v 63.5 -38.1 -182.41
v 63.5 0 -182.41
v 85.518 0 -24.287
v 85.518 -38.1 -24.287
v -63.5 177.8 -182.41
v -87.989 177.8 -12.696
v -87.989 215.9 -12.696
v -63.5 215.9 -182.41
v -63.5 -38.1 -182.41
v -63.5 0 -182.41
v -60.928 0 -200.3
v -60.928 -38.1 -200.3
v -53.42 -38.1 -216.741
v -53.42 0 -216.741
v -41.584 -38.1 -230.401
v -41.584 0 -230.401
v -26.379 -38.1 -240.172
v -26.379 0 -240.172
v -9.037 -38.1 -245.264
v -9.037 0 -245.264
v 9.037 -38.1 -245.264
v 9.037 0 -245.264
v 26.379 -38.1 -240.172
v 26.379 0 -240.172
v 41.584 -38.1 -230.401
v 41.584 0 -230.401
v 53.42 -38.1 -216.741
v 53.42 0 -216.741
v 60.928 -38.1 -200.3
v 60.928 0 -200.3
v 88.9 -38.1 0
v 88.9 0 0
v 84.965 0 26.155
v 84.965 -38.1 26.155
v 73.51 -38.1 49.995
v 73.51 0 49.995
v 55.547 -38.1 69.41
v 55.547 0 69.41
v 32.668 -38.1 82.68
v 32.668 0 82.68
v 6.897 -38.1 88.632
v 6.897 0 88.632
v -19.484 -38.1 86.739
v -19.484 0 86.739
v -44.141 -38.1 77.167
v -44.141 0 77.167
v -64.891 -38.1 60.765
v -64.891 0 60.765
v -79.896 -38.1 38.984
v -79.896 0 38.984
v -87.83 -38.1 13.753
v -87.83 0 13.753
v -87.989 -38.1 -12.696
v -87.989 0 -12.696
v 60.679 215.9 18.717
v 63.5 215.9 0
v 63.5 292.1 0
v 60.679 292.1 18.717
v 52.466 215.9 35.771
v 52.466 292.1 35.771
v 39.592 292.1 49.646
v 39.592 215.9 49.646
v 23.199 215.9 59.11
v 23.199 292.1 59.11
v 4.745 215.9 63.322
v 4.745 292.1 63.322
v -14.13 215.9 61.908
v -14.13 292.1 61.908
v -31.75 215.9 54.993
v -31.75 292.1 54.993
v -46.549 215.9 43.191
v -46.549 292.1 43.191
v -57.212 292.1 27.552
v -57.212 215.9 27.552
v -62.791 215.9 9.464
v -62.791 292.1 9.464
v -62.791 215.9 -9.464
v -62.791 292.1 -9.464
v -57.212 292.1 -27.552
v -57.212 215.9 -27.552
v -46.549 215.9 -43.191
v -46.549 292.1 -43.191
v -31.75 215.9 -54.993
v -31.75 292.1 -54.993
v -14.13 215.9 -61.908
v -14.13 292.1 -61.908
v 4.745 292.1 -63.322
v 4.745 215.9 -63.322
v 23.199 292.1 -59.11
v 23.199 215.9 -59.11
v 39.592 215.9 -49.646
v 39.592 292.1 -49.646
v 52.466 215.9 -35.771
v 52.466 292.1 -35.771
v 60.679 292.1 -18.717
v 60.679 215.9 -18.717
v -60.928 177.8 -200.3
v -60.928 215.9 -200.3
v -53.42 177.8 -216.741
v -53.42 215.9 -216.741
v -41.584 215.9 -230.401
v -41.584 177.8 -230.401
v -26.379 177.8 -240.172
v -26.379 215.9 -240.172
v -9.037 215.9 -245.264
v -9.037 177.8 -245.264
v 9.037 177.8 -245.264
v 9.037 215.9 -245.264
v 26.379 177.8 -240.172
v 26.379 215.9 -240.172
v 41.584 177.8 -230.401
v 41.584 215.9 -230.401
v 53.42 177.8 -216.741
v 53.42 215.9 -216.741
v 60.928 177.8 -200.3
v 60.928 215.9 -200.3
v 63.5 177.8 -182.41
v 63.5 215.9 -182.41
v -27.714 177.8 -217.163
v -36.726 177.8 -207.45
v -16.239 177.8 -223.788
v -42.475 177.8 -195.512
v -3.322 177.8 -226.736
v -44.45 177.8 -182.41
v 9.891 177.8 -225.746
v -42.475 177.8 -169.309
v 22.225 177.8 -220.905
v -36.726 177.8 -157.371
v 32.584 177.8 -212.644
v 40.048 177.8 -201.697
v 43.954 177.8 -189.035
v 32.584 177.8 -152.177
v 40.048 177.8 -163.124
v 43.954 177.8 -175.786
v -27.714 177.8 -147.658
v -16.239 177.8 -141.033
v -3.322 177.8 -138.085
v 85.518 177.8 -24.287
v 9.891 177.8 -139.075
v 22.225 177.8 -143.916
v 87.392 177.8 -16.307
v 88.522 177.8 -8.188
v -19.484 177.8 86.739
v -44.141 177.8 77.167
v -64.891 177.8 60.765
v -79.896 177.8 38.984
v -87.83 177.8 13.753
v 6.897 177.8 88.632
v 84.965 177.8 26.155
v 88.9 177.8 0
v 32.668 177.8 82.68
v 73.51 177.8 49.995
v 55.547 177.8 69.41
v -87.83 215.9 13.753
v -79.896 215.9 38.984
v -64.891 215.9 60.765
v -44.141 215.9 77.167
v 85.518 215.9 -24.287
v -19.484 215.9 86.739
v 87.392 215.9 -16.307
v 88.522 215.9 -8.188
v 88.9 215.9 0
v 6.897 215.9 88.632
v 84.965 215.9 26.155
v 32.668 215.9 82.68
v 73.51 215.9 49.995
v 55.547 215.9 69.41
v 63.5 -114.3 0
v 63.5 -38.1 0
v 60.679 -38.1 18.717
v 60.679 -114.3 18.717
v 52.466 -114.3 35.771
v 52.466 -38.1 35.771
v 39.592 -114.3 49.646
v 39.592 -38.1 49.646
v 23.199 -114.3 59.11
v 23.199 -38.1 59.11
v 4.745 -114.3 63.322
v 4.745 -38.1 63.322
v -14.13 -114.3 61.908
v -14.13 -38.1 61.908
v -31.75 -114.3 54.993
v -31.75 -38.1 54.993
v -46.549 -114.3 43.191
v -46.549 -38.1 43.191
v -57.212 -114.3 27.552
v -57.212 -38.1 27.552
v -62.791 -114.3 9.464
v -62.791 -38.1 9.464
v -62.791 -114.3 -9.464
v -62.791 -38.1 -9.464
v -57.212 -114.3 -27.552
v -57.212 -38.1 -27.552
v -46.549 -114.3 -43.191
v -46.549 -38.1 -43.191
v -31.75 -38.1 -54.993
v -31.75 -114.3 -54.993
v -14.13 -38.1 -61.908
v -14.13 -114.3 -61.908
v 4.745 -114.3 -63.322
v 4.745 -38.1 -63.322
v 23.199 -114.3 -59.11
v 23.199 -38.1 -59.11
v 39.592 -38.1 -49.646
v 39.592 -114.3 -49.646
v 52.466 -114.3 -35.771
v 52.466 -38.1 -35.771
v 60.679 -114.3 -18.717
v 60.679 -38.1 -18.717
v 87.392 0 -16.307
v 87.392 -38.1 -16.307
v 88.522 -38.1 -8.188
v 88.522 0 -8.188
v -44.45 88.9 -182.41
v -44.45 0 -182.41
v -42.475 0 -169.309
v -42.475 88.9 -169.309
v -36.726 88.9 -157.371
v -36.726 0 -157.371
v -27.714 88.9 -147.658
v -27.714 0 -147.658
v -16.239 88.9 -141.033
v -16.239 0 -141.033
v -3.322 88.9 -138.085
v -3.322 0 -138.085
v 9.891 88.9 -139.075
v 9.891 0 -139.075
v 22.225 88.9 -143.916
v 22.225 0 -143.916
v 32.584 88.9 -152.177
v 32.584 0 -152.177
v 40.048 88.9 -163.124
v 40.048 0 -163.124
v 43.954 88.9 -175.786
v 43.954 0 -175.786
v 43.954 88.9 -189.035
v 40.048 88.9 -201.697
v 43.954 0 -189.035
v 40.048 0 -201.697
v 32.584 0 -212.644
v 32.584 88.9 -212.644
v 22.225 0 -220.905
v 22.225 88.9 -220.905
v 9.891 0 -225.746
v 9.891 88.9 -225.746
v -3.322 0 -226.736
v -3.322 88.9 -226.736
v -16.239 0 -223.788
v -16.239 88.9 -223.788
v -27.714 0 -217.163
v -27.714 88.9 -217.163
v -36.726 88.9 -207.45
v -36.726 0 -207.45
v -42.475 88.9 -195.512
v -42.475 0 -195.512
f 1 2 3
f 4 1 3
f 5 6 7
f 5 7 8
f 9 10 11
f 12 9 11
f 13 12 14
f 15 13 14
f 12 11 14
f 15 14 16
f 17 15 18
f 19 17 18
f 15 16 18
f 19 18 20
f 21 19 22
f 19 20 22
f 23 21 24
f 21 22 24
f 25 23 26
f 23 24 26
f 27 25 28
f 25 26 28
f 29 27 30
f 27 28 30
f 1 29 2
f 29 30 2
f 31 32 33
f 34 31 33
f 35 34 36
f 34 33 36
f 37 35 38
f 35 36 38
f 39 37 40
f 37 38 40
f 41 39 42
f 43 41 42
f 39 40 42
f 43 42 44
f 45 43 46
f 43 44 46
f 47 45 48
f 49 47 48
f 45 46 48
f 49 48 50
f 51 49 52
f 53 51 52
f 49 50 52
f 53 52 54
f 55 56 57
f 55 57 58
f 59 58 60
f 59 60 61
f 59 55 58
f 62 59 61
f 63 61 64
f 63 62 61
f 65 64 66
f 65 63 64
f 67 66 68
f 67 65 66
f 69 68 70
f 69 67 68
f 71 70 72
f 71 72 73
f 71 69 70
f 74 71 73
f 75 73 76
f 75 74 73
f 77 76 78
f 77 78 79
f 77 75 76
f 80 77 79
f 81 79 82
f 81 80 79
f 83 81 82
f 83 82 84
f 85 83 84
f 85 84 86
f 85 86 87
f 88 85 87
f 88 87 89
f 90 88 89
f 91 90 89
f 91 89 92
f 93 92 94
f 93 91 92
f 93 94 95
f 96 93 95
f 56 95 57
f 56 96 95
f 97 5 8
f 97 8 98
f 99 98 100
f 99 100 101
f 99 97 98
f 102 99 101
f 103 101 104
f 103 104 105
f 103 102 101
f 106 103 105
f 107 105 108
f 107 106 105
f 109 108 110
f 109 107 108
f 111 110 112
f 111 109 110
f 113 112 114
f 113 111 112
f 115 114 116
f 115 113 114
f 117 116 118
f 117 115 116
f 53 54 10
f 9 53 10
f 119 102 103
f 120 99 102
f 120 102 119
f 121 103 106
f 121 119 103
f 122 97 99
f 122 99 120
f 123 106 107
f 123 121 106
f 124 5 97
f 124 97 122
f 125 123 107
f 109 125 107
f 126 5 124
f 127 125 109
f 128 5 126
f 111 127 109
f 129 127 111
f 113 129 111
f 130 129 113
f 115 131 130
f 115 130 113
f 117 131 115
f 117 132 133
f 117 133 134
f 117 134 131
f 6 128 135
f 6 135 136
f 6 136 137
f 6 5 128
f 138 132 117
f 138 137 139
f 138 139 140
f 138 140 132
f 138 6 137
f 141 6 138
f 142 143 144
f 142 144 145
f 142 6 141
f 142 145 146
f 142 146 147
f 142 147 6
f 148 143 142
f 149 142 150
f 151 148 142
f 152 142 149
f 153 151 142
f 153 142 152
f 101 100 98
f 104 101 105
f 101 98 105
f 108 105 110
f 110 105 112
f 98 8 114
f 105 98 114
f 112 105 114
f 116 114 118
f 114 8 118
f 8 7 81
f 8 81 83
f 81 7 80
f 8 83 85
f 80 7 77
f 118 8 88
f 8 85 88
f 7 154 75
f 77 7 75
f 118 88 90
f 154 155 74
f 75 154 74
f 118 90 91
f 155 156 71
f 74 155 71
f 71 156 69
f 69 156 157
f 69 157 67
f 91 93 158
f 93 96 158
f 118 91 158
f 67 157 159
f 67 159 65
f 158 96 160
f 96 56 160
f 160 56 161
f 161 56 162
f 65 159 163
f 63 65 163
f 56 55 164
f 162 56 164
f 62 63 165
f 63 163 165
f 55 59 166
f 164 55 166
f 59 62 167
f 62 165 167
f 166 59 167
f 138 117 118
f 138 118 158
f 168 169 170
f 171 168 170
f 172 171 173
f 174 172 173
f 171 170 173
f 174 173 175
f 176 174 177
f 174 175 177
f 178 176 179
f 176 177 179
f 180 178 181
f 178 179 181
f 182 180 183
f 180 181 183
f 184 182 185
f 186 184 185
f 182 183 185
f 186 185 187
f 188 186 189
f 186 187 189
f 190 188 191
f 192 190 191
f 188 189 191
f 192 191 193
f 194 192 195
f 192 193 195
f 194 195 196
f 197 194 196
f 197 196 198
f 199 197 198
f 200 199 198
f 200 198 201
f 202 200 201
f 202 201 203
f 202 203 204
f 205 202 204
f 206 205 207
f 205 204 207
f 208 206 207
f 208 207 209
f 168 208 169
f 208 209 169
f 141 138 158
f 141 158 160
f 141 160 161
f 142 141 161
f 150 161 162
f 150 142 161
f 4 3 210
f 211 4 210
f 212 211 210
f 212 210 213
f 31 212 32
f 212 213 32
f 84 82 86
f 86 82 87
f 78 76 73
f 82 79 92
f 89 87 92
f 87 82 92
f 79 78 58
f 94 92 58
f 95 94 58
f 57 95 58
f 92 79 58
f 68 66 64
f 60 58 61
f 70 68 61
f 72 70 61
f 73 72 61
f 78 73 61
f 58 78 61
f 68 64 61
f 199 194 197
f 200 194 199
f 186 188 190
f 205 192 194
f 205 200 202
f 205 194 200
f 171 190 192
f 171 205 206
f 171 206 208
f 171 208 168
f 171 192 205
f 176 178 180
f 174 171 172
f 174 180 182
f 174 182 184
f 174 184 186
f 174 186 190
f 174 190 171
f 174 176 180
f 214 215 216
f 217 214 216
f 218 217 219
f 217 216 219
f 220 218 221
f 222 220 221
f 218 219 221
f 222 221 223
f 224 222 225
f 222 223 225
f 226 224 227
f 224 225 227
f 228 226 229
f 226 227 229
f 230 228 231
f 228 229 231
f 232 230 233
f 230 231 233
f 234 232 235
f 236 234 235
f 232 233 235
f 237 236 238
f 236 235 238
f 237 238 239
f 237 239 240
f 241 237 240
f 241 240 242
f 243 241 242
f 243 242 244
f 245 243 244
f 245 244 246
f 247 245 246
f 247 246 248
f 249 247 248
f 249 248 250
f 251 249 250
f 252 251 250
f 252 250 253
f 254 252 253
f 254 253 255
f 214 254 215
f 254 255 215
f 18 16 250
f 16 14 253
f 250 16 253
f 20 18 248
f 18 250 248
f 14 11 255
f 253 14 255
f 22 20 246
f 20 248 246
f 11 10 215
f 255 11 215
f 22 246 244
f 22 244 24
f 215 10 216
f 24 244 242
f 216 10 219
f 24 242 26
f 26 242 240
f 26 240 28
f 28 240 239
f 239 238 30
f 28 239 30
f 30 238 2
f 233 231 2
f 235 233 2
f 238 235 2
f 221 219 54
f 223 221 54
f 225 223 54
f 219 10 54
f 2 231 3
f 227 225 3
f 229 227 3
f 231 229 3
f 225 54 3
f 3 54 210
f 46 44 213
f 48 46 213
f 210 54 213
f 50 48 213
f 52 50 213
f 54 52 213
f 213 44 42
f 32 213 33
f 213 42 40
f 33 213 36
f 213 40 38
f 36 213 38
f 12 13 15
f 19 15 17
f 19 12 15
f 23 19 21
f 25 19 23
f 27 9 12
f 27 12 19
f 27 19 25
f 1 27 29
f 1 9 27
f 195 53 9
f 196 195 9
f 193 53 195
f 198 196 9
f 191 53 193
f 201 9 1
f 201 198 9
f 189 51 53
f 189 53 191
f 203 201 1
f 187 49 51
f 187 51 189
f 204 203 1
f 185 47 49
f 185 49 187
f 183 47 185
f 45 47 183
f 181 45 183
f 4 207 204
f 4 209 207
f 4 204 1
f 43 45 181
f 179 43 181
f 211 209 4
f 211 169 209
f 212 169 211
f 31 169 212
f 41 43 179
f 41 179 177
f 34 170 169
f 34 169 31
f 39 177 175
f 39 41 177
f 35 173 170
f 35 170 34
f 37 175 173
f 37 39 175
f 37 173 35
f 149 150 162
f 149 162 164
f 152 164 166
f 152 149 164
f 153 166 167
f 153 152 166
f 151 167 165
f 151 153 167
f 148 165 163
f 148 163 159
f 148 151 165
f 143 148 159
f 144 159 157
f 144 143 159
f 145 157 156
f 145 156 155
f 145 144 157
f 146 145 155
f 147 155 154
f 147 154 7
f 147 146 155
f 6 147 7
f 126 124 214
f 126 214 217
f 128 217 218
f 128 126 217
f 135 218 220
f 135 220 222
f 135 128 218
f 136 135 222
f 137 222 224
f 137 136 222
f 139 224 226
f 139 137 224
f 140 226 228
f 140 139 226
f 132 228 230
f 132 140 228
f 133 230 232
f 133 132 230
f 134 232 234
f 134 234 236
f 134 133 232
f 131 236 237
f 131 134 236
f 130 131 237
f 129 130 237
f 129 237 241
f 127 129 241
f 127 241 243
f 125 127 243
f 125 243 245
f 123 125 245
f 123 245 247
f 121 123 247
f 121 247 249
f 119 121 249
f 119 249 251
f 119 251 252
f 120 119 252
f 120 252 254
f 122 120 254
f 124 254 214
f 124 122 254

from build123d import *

# Parameters (mm, degrees)
F1_DEPTH = 38.1
F2_R     = 63.5
F3_DEPTH = 76.2
F4_R     = 44.45
F5_DEPTH = 88.9


with BuildPart() as f1:
    # F0 (on Front) → F1 (new body)
    with BuildSketch(Plane.XZ):
        with BuildLine():
            Line((88.9, 0), (85.51811, -24.287093))
            ThreePointArc((85.51811, -24.287093), (88.050468, -12.260711), (88.9, 0))
        make_face()
        with BuildLine():
            Line((63.5, -182.410464), (85.51811, -24.287093))
            Line((85.51811, -24.287093), (88.9, 0))
            ThreePointArc((88.9, 0), (-6.364448, 88.671888), (-87.988724, -12.696234))
            Line((-87.988724, -12.696234), (-63.5, -182.410464))
            ThreePointArc((-63.5, -182.410464), (0, -245.910464), (63.5, -182.410464))
        make_face()
    extrude(amount=F1_DEPTH)

    # F2 (on face) → F3 (join)
    with BuildSketch(Plane.XZ.offset(38.1)):
        Circle(F2_R)
    extrude(amount=F3_DEPTH)

    # F4 (on face) → F5 (join)
    with BuildSketch(Plane(origin=(0, 0, 0), x_dir=(-1, 0, 0), z_dir=(0, 1, 0))):
        with Locations((0, -182.410464)):
            Circle(F4_R)
    extrude(amount=F5_DEPTH)

    # F6: F1 across face


with BuildPart() as f1_1:
    add(f1.part)
    add(f1.part.mirror(Plane(origin=(0, 88.9, -182.410464), x_dir=(-1, 0, 0), z_dir=(0, 1, 0))))


solid = f1_1.part
